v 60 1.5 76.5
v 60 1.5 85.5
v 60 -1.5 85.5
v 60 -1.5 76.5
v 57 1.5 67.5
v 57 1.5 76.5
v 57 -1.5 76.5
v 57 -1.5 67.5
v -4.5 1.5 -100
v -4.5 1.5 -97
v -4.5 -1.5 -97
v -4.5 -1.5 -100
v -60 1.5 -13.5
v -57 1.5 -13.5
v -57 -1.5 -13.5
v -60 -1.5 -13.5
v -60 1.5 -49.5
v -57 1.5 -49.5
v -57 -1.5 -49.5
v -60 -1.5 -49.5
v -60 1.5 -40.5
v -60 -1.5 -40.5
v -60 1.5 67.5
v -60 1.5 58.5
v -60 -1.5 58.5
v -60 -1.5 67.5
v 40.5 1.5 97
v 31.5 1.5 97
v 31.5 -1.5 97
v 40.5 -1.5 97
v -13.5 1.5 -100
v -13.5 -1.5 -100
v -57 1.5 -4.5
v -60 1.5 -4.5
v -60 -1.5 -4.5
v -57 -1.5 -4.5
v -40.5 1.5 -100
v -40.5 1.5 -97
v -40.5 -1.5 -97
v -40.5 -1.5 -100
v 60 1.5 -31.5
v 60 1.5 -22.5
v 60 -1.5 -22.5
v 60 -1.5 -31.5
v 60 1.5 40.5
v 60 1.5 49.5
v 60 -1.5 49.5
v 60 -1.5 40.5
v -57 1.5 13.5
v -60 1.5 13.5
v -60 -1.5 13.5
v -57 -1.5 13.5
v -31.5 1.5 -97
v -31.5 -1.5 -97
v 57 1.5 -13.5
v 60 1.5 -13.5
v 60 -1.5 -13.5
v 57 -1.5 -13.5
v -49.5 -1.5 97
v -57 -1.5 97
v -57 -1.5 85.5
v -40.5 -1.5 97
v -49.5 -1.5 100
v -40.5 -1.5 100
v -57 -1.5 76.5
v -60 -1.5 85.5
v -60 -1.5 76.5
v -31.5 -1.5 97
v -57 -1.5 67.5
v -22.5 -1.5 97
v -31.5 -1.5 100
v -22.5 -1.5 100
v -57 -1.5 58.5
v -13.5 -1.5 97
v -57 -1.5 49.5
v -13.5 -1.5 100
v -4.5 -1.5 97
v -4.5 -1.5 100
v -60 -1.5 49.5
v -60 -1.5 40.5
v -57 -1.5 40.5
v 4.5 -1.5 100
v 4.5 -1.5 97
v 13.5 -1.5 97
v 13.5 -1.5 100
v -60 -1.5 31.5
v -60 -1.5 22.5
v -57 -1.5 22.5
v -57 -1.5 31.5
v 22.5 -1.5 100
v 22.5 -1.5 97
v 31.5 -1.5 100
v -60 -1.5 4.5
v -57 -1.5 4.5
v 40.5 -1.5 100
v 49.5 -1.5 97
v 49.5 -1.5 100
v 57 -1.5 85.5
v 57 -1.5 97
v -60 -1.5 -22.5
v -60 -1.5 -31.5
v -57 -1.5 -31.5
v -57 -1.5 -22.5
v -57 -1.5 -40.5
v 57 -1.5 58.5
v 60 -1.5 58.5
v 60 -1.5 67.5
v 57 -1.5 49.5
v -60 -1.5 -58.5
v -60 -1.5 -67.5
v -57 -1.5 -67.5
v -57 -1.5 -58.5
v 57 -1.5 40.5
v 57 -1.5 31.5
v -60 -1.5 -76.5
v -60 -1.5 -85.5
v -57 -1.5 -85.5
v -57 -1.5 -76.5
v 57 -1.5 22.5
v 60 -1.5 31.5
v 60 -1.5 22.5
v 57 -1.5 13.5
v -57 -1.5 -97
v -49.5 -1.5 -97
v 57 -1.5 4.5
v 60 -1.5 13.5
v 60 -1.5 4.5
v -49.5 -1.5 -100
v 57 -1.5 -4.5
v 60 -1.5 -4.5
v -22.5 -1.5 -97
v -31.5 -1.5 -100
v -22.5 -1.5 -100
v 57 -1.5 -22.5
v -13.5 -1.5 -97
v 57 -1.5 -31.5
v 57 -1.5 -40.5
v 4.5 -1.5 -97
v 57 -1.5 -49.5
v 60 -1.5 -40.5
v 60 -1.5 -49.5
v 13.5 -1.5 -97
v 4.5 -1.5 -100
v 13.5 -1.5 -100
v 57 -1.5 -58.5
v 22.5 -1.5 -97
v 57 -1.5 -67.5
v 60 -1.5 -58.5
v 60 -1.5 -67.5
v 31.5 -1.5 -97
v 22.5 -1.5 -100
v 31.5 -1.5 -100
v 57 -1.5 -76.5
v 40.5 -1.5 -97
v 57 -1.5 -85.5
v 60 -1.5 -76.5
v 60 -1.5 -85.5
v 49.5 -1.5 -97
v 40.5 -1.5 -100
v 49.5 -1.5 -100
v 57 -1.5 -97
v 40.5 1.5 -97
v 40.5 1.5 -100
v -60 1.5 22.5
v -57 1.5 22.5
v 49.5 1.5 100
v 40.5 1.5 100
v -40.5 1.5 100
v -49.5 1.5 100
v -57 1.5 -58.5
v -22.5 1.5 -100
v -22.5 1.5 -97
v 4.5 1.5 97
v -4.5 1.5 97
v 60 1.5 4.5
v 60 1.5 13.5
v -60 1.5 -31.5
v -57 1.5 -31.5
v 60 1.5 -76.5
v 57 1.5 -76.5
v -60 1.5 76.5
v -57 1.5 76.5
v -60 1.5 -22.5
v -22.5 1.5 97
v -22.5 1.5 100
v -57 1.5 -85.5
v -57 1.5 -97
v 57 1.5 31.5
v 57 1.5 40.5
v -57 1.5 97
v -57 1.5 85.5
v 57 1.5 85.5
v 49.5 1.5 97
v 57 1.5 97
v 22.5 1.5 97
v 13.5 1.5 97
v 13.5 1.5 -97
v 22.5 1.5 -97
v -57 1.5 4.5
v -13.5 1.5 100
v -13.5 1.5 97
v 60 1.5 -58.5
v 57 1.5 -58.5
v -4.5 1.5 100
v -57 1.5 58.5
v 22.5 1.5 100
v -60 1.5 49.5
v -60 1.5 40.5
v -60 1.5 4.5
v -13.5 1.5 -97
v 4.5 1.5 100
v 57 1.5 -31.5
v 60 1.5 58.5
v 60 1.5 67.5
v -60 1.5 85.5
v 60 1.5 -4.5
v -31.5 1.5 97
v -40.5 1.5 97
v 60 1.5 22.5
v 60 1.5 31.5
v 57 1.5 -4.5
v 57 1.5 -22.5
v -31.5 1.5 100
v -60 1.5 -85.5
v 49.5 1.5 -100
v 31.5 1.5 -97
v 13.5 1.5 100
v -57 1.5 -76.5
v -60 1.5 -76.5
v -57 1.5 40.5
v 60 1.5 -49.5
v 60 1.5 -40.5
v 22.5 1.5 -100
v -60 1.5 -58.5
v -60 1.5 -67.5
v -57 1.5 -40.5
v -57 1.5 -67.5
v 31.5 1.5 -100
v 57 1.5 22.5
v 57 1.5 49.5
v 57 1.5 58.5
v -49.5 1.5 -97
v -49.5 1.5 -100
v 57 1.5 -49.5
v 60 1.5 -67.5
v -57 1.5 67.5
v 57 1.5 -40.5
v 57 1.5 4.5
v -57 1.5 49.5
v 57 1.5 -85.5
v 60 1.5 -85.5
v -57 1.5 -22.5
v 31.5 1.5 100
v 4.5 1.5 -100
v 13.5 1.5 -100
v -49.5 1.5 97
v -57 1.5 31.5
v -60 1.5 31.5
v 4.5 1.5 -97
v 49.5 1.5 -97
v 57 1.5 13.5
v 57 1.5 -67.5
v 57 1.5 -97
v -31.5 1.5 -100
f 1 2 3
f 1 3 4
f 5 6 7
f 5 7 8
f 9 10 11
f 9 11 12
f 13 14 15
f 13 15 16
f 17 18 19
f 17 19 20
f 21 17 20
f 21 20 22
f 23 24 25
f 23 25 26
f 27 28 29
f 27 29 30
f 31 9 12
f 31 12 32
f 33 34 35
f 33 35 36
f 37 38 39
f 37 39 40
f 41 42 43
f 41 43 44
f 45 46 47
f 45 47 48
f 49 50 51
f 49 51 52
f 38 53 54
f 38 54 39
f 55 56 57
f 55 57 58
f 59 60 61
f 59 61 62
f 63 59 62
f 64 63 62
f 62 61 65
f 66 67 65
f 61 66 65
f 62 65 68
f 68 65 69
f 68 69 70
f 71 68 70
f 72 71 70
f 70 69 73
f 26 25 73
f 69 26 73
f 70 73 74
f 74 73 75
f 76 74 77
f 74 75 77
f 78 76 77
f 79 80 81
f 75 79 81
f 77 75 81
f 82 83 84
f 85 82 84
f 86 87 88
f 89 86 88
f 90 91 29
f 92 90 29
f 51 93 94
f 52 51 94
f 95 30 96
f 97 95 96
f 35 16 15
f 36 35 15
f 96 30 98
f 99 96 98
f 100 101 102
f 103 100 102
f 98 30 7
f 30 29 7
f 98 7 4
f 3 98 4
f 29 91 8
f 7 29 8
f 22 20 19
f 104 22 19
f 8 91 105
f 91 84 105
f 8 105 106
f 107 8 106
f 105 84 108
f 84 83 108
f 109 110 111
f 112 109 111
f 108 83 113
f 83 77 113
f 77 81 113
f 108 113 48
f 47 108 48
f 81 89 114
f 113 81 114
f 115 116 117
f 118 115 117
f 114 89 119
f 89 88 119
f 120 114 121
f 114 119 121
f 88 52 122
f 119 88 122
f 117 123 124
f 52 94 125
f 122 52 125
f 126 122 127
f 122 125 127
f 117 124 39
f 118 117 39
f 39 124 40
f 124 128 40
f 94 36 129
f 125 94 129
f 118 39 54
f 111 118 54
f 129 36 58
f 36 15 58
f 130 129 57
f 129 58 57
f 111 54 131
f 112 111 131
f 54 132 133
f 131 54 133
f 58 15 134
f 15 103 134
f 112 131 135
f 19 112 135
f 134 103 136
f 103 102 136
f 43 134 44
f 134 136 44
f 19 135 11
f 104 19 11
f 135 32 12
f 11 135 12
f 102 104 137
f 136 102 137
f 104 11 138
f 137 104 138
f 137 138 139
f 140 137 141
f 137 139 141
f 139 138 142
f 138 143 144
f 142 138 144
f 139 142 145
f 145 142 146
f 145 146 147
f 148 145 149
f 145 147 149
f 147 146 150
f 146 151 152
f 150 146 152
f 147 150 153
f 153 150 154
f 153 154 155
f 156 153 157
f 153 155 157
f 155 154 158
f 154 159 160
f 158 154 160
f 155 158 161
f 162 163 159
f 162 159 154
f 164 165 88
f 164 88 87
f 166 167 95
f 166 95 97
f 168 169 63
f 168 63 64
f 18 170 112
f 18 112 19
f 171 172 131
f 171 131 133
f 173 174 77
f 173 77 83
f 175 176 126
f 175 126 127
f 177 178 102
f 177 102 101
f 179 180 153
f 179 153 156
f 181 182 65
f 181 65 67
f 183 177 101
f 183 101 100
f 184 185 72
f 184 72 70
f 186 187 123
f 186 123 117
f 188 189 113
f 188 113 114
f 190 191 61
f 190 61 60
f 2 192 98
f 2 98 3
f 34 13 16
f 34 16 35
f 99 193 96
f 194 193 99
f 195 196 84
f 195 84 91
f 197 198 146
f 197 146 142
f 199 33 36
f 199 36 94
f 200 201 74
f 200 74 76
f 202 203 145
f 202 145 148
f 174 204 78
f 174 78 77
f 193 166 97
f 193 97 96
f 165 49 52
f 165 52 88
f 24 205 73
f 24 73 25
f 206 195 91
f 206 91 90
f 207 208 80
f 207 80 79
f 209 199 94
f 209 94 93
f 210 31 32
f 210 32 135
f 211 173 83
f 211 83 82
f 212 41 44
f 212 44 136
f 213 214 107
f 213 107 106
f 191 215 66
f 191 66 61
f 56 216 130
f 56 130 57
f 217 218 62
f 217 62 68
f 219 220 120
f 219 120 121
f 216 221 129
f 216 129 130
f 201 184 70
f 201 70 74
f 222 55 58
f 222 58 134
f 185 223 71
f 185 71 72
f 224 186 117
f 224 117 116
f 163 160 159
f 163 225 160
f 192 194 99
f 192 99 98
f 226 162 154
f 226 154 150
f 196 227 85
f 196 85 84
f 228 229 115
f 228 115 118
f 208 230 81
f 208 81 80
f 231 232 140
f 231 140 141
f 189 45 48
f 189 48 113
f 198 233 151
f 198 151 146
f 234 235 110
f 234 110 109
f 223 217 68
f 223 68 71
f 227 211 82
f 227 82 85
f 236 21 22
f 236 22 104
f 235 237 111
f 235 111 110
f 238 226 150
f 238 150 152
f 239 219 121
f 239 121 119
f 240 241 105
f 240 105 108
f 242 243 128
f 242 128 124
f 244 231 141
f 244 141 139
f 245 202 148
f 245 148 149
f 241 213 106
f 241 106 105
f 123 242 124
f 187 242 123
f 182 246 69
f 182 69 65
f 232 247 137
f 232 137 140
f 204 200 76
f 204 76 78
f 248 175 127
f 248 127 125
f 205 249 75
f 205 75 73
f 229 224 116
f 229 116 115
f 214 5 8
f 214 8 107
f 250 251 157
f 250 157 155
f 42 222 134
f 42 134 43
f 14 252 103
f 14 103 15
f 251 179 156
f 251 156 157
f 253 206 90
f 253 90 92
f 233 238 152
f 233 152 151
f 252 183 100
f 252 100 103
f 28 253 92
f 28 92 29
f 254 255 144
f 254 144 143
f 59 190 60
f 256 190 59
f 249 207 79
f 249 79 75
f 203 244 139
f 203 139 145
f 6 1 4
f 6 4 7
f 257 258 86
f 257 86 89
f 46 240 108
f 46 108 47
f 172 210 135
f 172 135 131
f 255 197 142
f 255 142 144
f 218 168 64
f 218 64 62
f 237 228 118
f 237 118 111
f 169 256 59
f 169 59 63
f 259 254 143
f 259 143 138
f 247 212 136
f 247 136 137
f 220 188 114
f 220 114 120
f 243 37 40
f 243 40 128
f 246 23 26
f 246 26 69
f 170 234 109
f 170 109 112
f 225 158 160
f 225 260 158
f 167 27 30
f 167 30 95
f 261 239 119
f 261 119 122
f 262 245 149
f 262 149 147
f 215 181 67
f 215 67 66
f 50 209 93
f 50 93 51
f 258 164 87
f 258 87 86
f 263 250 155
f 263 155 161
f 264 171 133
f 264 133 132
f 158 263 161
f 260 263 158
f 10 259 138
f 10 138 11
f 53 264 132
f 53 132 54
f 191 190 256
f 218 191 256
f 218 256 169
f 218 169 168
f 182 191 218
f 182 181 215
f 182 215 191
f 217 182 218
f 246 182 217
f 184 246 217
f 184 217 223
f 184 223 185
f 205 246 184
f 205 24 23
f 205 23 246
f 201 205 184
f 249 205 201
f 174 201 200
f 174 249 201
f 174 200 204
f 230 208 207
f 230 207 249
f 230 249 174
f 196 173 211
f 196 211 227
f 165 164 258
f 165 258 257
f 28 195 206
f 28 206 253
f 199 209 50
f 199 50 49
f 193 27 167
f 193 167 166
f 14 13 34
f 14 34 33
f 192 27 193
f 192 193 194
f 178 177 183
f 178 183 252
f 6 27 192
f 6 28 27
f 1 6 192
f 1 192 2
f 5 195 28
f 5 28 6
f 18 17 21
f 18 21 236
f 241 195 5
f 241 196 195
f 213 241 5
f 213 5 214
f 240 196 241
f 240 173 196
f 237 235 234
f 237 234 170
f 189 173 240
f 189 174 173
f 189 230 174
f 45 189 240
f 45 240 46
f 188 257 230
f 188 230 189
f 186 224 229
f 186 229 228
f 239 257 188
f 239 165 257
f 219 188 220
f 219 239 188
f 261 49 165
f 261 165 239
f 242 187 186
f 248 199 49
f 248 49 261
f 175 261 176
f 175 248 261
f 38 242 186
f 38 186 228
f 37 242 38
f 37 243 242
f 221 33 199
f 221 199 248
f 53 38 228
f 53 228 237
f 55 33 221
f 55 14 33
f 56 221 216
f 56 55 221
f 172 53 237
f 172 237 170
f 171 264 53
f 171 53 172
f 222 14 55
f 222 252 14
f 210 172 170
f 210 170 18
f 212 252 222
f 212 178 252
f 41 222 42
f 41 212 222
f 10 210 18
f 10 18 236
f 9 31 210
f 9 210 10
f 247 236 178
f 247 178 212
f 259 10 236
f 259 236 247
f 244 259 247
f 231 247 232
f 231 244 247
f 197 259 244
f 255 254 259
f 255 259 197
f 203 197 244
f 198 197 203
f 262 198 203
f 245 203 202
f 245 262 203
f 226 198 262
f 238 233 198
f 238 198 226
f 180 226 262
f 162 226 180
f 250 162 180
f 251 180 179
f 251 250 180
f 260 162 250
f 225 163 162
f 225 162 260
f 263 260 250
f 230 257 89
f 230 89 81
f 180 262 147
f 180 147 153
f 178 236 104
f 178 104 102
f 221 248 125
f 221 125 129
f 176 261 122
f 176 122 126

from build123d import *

# Parameters (mm, degrees)
BOSS_EXTRUDE1_DEPTH = 1.5


with BuildPart() as part:
    # Sketch1 → Boss-Extrude1 (new, symmetric)
    with BuildSketch(Plane(origin=(0, 0, 0), x_dir=(1, 0, 0), z_dir=(0, 1, 0))):
        Polygon((49.5, 100), (40.5, 100), (40.5, 97), (31.5, 97), (31.5, 100), (22.5, 100), (22.5, 97), (13.5, 97), (13.5, 100), (4.5, 100), (4.5, 97), (-4.5, 97), (-4.5, 100), (-13.5, 100), (-13.5, 97), (-22.5, 97), (-22.5, 100), (-31.5, 100), (-31.5, 97), (-40.5, 97), (-40.5, 100), (-49.5, 100), (-49.5, 97), (-57, 97), (-57, 85.5), (-60, 85.5), (-60, 76.5), (-57, 76.5), (-57, 67.5), (-60, 67.5), (-60, 58.5), (-57, 58.5), (-57, 49.5), (-60, 49.5), (-60, 40.5), (-57, 40.5), (-57, 31.5), (-60, 31.5), (-60, 22.5), (-57, 22.5), (-57, 13.5), (-60, 13.5), (-60, 4.5), (-57, 4.5), (-57, -4.5), (-60, -4.5), (-60, -13.5), (-57, -13.5), (-57, -22.5), (-60, -22.5), (-60, -31.5), (-57, -31.5), (-57, -40.5), (-60, -40.5), (-60, -49.5), (-57, -49.5), (-57, -58.5), (-60, -58.5), (-60, -67.5), (-57, -67.5), (-57, -76.5), (-60, -76.5), (-60, -85.5), (-57, -85.5), (-57, -97), (-49.5, -97), (-49.5, -100), (-40.5, -100), (-40.5, -97), (-31.5, -97), (-31.5, -100), (-22.5, -100), (-22.5, -97), (-13.5, -97), (-13.5, -100), (-4.5, -100), (-4.5, -97), (4.5, -97), (4.5, -100), (13.5, -100), (13.5, -97), (22.5, -97), (22.5, -100), (31.5, -100), (31.5, -97), (40.5, -97), (40.5, -100), (49.5, -100), (49.5, -97), (57, -97), (57, -85.5), (60, -85.5), (60, -76.5), (57, -76.5), (57, -67.5), (60, -67.5), (60, -58.5), (57, -58.5), (57, -49.5), (60, -49.5), (60, -40.5), (57, -40.5), (57, -31.5), (60, -31.5), (60, -22.5), (57, -22.5), (57, -13.5), (60, -13.5), (60, -4.5), (57, -4.5), (57, 4.5), (60, 4.5), (60, 13.5), (57, 13.5), (57, 22.5), (60, 22.5), (60, 31.5), (57, 31.5), (57, 40.5), (60, 40.5), (60, 49.5), (57, 49.5), (57, 58.5), (60, 58.5), (60, 67.5), (57, 67.5), (57, 76.5), (60, 76.5), (60, 85.5), (57, 85.5), (57, 97), (49.5, 97), align=None)
    extrude(amount=BOSS_EXTRUDE1_DEPTH, both=True)


solid = part.part
